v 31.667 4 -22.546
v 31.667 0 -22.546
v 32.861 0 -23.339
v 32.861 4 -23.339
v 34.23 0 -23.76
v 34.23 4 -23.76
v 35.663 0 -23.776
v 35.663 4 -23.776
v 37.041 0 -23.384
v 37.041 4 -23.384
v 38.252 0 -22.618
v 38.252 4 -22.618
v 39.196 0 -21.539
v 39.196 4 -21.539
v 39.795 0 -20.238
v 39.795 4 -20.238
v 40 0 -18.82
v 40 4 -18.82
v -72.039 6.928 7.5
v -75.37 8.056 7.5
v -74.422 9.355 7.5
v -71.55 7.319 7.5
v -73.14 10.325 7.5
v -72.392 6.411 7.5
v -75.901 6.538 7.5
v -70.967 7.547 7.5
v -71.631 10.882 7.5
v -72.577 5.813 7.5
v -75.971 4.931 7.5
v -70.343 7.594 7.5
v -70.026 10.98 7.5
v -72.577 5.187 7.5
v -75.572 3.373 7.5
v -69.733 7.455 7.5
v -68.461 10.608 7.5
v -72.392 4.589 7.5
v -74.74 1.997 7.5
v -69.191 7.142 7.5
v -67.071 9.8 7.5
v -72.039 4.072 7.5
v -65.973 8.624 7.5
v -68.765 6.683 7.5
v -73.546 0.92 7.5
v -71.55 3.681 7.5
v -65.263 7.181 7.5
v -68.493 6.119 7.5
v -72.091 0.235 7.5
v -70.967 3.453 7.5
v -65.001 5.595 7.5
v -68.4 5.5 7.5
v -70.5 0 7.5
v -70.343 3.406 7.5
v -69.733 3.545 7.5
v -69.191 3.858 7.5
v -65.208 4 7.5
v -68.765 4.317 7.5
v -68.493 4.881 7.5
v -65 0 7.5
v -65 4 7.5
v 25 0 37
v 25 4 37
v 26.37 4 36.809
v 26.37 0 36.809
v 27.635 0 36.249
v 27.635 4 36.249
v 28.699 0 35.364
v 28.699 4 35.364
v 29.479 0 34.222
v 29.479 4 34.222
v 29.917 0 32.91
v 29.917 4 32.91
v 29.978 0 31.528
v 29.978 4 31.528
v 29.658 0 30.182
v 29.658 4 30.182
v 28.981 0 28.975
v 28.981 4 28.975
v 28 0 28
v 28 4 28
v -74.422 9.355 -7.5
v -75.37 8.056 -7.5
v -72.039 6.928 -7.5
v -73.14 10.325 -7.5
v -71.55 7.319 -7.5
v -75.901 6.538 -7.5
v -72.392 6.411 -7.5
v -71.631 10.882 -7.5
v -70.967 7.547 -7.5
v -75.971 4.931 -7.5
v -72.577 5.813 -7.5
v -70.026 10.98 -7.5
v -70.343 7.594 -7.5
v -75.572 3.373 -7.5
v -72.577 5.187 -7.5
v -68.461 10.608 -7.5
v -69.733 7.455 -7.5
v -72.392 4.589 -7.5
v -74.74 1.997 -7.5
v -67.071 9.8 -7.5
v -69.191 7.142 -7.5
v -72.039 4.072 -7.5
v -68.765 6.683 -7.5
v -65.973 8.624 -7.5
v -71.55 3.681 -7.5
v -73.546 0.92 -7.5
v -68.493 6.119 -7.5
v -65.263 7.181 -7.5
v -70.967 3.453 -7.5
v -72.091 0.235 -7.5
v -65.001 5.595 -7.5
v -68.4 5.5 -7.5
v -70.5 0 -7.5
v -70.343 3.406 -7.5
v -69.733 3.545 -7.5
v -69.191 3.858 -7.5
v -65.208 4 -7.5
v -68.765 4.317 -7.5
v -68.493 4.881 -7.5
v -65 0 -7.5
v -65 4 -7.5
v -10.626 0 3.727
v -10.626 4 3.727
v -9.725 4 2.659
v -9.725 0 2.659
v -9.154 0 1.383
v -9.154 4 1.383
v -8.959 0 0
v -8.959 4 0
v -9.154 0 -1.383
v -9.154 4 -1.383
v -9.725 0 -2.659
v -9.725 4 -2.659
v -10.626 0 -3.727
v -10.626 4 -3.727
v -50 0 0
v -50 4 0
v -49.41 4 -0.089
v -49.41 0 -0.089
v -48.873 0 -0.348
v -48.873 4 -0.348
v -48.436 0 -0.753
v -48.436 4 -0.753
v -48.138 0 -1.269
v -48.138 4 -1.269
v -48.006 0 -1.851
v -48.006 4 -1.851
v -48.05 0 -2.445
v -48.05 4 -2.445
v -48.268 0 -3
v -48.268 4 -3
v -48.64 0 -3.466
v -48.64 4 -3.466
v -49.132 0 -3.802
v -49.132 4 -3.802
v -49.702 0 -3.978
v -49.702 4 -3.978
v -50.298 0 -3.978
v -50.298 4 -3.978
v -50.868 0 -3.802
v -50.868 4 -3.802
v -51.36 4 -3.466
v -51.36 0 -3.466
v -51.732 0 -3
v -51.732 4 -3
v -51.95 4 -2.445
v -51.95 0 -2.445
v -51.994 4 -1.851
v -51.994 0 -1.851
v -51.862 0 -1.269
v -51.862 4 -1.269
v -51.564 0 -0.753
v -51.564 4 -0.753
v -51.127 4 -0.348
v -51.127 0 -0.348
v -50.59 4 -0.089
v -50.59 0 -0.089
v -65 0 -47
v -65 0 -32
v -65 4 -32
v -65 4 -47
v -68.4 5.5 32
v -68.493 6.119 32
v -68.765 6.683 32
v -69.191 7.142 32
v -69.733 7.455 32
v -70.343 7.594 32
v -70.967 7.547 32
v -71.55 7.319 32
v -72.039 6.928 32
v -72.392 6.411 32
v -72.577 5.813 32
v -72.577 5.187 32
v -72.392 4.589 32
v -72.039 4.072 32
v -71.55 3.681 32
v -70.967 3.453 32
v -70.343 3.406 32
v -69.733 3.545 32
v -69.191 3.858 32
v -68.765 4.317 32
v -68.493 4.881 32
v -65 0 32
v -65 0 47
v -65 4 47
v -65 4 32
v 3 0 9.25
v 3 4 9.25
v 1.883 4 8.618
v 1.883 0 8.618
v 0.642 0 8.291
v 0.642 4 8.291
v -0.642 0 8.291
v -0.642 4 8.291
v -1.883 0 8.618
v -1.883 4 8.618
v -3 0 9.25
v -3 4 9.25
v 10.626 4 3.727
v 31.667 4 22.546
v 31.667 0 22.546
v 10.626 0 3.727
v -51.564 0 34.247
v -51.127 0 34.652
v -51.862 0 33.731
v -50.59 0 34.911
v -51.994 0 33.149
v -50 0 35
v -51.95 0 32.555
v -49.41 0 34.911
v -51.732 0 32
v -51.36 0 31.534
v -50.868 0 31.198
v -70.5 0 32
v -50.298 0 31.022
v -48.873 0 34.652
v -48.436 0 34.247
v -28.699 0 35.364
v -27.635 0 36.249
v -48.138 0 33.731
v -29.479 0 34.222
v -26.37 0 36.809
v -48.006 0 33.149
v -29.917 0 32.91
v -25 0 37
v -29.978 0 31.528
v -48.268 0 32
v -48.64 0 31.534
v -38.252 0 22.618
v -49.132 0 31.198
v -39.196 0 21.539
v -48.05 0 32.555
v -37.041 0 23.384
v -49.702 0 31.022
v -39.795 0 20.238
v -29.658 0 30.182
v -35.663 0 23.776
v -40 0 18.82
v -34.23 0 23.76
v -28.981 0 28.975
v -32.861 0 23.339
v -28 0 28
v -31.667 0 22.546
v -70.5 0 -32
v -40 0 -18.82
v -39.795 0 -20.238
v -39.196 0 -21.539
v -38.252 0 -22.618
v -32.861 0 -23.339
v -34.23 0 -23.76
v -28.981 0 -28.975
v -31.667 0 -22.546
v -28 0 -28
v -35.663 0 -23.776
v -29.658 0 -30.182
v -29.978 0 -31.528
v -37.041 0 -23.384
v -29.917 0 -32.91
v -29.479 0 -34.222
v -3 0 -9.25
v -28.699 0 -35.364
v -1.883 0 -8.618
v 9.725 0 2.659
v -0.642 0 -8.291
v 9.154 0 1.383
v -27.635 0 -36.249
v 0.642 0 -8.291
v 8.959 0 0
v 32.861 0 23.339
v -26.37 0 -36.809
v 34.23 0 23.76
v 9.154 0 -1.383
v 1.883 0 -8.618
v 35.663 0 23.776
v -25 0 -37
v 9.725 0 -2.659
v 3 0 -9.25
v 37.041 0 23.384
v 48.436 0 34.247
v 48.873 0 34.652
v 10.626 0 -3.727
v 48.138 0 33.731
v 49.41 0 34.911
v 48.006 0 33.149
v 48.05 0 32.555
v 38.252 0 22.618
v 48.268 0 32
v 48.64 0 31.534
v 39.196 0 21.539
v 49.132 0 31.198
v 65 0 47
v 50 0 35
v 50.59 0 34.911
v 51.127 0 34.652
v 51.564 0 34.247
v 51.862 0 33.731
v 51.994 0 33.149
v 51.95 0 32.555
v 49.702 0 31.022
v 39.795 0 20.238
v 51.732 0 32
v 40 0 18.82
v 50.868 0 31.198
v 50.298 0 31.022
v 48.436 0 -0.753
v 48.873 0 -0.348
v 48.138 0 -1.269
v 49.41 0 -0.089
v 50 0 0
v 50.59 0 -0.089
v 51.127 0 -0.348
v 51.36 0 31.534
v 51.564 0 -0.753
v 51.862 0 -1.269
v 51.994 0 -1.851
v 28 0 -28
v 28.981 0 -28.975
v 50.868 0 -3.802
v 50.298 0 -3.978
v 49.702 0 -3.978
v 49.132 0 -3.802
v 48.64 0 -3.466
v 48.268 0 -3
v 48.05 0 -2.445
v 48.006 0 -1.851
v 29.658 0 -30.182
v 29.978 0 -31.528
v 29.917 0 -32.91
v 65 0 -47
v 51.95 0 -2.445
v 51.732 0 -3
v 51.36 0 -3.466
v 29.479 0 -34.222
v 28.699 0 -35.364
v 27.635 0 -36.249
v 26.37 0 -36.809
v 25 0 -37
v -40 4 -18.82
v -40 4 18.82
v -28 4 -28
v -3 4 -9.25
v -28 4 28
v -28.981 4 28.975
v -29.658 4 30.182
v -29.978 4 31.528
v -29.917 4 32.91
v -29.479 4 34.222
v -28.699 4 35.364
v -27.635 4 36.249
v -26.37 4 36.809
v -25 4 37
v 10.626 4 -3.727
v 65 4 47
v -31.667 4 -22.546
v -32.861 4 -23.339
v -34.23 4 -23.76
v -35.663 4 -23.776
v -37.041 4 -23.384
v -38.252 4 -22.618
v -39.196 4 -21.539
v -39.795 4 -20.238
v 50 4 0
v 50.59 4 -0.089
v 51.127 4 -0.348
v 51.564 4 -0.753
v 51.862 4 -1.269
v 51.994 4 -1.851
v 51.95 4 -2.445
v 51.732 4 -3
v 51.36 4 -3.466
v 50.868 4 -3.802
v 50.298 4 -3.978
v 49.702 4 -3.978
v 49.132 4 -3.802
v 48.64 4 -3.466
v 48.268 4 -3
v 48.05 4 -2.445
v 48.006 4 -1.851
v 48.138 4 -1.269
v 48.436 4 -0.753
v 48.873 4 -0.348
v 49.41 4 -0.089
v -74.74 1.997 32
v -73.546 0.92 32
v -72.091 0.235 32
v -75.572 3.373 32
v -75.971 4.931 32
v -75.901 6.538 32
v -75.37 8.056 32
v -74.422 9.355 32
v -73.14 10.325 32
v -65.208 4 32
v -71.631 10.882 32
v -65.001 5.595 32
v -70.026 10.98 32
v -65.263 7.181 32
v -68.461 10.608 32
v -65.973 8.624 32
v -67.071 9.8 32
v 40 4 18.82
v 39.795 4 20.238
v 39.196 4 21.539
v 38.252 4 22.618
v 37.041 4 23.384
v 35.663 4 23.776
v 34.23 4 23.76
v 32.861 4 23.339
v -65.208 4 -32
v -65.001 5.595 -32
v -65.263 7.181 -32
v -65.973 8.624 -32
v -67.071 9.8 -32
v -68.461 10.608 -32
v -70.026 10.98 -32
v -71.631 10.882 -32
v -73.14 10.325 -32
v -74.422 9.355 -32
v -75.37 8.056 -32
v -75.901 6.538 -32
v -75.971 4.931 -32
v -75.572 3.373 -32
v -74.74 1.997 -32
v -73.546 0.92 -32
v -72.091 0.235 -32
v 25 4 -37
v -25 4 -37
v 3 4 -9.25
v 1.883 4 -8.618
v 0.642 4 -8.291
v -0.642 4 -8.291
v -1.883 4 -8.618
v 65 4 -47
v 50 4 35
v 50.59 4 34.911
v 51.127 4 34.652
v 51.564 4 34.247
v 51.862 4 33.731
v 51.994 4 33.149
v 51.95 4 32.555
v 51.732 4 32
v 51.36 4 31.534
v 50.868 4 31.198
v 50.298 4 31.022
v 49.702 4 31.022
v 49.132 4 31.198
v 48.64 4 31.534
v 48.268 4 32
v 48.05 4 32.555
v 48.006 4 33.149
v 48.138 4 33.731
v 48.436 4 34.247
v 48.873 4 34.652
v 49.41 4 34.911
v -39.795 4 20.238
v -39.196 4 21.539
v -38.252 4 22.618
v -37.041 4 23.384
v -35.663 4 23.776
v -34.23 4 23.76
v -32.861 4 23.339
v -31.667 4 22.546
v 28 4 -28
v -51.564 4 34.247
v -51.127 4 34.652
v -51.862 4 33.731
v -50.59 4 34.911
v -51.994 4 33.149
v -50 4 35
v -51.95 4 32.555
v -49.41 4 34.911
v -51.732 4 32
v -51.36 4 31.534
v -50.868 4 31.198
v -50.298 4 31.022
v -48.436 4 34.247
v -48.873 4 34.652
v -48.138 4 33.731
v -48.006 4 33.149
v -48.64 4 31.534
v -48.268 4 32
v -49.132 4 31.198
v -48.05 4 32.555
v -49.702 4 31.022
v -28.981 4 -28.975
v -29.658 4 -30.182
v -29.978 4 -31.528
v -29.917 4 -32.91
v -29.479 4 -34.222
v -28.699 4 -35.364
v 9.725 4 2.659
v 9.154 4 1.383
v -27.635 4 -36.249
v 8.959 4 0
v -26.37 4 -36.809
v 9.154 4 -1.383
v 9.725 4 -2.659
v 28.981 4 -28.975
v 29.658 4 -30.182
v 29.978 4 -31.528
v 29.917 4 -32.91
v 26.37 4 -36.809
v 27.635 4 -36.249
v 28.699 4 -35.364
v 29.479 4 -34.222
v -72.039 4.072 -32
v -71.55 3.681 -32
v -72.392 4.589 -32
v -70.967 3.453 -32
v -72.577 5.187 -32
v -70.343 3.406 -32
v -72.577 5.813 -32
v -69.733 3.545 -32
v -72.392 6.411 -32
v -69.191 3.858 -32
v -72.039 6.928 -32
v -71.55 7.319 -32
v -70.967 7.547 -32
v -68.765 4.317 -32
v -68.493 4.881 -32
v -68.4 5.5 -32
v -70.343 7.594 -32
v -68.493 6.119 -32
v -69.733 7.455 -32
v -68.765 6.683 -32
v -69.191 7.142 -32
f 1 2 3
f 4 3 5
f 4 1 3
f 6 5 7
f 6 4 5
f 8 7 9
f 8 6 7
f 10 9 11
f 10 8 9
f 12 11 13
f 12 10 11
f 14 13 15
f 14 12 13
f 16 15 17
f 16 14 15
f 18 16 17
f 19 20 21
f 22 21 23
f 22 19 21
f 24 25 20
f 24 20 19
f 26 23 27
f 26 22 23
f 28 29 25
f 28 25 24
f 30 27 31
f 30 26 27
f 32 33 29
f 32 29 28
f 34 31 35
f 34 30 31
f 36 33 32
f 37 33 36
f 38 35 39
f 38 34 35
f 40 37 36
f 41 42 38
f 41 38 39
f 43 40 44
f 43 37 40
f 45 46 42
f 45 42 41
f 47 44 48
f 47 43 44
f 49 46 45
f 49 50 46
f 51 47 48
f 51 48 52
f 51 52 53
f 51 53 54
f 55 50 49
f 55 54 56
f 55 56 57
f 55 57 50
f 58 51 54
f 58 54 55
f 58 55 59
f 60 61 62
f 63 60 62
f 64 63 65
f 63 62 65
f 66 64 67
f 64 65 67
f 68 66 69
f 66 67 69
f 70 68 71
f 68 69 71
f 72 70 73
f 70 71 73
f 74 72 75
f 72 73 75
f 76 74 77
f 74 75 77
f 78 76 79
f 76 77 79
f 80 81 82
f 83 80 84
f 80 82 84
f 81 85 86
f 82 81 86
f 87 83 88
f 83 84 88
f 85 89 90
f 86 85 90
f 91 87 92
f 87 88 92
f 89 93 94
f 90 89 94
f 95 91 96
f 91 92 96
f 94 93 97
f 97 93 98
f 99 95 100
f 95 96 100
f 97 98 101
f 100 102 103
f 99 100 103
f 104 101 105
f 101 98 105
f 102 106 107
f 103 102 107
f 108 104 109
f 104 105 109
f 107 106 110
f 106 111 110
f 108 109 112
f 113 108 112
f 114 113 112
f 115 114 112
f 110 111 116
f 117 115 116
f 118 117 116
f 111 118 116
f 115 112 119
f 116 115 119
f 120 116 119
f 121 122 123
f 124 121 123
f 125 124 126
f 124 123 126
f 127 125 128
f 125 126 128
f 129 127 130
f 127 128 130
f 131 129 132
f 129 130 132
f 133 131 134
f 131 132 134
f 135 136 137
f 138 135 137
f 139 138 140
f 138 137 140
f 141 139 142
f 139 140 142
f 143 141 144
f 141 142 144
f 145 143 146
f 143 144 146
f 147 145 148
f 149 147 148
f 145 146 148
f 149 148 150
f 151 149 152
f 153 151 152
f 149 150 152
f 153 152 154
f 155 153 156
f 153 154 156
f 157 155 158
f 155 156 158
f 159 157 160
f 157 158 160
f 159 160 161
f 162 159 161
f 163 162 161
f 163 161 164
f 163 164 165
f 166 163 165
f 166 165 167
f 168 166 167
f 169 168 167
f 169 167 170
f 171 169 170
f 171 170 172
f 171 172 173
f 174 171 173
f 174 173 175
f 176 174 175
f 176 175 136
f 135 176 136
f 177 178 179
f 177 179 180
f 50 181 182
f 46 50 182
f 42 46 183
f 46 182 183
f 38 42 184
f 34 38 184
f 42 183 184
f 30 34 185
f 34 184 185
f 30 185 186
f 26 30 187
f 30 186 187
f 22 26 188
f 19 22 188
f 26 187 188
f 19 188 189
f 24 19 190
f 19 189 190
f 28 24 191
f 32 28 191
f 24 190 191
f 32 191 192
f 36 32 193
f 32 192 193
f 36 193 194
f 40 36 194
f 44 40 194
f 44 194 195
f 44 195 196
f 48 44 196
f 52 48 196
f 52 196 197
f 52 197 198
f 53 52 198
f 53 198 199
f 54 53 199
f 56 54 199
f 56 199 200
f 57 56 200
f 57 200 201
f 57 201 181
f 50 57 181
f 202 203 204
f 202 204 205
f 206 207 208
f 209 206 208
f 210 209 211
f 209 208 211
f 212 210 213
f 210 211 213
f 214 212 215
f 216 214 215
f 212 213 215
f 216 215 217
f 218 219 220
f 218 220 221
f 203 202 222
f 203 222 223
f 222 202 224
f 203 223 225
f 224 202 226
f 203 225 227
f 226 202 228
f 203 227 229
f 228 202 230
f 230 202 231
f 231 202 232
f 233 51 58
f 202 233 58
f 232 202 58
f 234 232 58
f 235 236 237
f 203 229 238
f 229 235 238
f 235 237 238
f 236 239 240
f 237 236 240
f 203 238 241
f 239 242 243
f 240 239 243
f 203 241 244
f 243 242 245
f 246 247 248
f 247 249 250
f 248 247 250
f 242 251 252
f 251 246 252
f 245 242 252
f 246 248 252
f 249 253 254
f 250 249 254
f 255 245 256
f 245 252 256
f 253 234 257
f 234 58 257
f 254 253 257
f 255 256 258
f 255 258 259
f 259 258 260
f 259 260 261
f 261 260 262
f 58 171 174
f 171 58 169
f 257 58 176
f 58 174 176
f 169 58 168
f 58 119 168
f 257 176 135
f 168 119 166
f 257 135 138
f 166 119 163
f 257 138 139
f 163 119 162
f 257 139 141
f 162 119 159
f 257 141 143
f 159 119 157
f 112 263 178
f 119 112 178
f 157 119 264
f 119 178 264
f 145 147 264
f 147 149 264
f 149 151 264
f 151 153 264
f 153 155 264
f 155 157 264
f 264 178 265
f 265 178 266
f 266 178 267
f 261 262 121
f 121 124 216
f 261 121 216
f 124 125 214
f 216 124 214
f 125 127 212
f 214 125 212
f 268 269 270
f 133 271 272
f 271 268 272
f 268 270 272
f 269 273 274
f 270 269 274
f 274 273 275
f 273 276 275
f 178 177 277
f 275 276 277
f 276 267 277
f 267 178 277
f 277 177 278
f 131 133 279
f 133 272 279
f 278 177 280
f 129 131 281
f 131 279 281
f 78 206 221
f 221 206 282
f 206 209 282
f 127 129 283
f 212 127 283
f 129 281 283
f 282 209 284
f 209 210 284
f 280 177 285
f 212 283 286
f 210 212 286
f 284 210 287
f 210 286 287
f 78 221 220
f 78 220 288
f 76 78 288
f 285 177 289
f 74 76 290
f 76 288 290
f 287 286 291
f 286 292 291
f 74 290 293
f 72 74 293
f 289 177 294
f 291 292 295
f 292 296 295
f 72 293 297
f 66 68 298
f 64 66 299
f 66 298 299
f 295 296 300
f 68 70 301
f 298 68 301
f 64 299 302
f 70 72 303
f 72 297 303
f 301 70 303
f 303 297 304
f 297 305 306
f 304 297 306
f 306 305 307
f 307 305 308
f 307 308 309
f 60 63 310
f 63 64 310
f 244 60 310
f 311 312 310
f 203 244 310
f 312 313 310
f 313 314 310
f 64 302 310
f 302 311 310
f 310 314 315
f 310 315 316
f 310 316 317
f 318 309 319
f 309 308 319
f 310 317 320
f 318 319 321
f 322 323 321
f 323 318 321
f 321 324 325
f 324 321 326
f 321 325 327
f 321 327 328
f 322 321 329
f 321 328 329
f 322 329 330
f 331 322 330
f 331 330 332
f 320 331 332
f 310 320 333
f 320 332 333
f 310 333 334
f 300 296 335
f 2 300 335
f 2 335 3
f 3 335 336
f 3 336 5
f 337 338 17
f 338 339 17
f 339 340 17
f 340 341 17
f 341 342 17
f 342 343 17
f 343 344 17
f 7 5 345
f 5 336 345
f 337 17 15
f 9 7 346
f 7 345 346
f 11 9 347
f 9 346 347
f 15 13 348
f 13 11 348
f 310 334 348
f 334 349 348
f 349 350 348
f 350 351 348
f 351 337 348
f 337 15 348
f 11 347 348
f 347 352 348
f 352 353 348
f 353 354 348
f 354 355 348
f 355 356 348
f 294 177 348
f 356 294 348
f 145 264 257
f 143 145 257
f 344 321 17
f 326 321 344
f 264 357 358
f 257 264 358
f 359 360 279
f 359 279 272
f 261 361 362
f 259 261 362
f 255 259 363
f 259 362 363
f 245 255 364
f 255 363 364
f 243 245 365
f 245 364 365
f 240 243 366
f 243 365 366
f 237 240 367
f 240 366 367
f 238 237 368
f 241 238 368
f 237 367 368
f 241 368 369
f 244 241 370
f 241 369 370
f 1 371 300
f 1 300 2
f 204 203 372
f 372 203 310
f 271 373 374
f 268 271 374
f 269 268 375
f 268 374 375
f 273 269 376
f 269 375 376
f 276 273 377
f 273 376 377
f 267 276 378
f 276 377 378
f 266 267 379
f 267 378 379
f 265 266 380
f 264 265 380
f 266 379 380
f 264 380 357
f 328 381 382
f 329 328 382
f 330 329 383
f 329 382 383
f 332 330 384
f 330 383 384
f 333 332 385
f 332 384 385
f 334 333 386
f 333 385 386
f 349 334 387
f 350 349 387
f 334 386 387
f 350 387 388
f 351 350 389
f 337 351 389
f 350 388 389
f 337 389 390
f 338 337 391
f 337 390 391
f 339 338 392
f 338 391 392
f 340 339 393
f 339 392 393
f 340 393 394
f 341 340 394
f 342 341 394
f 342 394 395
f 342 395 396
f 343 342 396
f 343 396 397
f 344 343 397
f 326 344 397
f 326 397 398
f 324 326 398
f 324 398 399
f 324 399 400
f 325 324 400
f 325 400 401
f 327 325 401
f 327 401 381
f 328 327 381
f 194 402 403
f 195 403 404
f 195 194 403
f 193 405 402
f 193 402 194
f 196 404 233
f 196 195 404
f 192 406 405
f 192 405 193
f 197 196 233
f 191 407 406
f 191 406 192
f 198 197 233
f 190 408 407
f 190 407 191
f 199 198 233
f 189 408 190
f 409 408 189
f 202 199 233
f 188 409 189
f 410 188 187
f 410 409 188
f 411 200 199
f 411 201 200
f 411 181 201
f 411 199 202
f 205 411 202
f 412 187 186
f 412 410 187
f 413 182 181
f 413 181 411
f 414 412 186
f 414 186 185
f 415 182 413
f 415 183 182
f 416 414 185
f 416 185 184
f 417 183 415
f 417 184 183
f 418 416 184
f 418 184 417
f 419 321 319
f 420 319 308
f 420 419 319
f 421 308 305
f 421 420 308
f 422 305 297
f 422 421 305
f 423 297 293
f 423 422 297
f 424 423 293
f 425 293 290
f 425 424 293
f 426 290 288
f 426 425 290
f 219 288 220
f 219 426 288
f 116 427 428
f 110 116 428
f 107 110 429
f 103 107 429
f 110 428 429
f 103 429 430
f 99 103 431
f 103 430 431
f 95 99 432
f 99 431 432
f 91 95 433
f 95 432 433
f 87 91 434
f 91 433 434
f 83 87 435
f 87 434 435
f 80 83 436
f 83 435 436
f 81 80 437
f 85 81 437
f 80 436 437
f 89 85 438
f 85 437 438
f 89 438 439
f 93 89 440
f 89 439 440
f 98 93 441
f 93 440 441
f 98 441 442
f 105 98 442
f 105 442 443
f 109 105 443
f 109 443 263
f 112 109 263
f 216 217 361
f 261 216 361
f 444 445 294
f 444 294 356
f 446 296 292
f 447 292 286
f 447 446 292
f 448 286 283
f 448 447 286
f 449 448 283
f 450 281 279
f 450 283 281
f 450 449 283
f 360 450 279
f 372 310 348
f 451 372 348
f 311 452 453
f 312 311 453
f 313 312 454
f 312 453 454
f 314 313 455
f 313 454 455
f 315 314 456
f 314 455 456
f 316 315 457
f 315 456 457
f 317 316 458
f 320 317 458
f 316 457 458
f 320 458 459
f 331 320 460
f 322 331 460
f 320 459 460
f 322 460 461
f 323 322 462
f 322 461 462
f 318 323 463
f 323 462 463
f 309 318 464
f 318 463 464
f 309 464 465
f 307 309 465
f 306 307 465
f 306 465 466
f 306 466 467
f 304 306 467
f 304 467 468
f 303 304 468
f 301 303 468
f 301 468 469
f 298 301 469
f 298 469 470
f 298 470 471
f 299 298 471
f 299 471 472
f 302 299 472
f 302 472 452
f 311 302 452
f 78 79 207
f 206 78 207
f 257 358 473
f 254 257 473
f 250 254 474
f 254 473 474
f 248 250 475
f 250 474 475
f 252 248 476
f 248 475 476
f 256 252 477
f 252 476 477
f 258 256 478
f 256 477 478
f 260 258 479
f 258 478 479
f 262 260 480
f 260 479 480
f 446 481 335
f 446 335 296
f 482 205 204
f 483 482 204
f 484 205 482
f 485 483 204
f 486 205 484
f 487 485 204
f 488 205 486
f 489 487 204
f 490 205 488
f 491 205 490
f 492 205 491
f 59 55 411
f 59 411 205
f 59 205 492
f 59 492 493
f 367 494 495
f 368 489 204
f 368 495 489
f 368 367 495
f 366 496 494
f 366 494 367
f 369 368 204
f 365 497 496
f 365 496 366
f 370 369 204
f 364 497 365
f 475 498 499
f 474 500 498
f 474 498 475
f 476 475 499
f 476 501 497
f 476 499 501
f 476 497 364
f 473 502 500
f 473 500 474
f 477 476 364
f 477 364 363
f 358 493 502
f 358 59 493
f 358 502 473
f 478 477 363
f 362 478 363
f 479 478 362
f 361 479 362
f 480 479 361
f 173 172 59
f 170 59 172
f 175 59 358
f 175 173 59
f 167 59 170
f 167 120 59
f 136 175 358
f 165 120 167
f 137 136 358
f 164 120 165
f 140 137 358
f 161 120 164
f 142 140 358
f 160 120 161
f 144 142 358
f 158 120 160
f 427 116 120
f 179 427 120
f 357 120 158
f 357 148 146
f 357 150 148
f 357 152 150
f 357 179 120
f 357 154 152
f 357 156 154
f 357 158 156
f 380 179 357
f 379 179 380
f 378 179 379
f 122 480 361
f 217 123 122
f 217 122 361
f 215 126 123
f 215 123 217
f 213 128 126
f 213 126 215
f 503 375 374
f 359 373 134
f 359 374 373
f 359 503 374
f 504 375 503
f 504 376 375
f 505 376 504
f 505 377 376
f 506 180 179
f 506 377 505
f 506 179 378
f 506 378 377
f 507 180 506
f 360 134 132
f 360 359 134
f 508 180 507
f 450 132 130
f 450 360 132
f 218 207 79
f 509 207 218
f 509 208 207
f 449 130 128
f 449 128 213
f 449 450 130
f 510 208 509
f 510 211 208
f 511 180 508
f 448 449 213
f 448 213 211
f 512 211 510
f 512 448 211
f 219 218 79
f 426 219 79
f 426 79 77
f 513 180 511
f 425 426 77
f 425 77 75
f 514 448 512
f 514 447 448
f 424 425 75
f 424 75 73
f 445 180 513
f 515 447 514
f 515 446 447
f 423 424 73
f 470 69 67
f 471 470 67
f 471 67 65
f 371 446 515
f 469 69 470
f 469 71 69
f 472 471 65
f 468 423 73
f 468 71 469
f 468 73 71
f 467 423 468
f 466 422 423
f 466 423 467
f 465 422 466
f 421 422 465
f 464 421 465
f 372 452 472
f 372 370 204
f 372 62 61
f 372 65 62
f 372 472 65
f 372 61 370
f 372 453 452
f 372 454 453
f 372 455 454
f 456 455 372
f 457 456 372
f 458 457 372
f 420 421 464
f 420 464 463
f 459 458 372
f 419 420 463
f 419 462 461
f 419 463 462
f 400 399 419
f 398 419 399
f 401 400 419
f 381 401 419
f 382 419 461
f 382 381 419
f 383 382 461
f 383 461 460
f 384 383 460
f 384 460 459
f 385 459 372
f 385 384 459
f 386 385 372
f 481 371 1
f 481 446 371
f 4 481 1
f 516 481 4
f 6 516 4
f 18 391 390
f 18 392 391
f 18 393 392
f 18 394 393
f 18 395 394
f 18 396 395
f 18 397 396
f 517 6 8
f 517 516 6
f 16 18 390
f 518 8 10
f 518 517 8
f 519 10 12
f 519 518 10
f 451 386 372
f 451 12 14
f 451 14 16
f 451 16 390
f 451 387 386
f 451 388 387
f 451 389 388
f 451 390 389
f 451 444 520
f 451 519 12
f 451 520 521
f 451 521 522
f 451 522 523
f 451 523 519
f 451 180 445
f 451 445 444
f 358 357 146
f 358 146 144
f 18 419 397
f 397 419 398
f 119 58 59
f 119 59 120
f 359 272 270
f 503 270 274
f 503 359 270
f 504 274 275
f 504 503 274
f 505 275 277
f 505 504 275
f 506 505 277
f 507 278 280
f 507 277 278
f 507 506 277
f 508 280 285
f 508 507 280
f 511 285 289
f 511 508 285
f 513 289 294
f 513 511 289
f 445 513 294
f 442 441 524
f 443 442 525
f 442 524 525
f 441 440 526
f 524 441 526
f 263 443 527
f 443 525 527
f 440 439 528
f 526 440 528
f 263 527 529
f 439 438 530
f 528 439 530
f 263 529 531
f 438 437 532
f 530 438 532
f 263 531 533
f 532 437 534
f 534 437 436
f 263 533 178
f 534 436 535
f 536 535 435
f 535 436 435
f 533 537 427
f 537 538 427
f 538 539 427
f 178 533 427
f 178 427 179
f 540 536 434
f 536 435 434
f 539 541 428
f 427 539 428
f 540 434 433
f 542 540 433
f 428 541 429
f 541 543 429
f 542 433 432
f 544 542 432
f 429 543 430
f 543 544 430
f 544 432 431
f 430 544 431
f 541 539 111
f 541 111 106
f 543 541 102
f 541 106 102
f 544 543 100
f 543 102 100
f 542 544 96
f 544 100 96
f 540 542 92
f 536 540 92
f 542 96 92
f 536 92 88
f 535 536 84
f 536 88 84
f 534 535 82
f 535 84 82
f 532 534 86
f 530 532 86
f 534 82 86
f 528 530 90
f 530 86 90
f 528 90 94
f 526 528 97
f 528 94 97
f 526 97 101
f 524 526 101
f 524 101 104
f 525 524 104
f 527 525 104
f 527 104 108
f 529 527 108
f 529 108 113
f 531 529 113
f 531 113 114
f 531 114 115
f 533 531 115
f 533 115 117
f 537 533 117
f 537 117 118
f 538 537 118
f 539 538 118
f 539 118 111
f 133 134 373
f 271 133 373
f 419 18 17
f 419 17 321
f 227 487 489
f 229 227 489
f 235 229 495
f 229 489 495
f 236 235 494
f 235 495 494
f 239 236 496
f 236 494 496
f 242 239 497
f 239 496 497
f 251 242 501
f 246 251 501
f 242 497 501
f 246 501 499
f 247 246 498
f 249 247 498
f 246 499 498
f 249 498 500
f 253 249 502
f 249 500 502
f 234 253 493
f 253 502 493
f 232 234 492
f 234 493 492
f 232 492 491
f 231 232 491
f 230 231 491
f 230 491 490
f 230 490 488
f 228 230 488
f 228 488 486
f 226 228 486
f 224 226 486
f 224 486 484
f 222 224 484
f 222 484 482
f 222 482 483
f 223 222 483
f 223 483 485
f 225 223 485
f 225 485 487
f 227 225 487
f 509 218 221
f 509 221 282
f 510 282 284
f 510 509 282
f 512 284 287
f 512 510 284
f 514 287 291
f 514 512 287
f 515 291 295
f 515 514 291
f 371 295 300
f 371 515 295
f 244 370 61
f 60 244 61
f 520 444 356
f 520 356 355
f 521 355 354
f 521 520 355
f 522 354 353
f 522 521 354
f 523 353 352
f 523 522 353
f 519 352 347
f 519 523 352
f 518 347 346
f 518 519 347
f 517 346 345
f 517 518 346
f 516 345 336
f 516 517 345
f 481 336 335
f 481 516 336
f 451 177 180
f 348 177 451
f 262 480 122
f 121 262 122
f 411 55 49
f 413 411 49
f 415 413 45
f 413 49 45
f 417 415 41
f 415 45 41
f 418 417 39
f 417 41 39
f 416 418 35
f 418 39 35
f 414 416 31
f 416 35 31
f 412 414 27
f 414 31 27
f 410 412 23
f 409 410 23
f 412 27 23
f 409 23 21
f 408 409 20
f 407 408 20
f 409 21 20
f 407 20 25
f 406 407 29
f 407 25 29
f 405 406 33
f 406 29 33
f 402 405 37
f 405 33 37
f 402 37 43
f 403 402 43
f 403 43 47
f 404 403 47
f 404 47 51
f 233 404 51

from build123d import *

# Parameters (mm, degrees)
SKETCH_1_W           = 130
SKETCH_1_H           = 94
EXTRUDE_1_DEPTH      = 4
EXTRUDE_2_DEPTH      = 32
EXTRUDE_2_DEPTH_BACK = 32
SKETCH_4_R           = 2.1
CUT_EXTRUDE_1_DEPTH  = 122.379569945
SKETCH_10_W          = 11
SKETCH_10_H          = 15
CUT_EXTRUDE_2_DEPTH  = 24
CUT_EXTRUDE_3_DEPTH  = 10
SKETCH_12_R          = 2
CUT_EXTRUDE_4_DEPTH  = 10


with BuildPart() as part:
    # Эскиз1 → Бобышка-Вытянуть1 (new body)
    with BuildSketch(Plane(origin=(0, 0, 0), x_dir=(1, 0, 0), z_dir=(0, 1, 0))):
        Rectangle(SKETCH_1_W, SKETCH_1_H)
    extrude(amount=EXTRUDE_1_DEPTH)

    # Эскиз2 → Бобышка-Вытянуть2 (add, two sides: drawn at the far end of the back side and taken through both)
    with BuildSketch(Plane.XY.offset(-EXTRUDE_2_DEPTH_BACK)):
        with BuildLine():
            Line((-65, 4), (-65.208497378, 4))
            ThreePointArc((-65.208497378, 4), (-73.81662479, 9.887482194), (-70.5, 0))
            Line((-70.5, 0), (-65, 0))
            Line((-65, 0), (-65, 4))
        make_face()
    extrude(amount=EXTRUDE_2_DEPTH + EXTRUDE_2_DEPTH_BACK)

    # Эскиз4 → Вырез-Вытянуть1 (cut, through all)
    with BuildSketch(Plane.XY.offset(47)):
        with Locations((-70.5, 5.5)):
            Circle(SKETCH_4_R)
    extrude(amount=-CUT_EXTRUDE_1_DEPTH, mode=Mode.SUBTRACT)

    # Эскиз10 → Вырез-Вытянуть2 (cut)
    with BuildSketch(Plane(origin=(0, 0, 0), x_dir=(1, 0, 0), z_dir=(0, 1, 0))):
        with Locations((-70.5, 0)):
            Rectangle(SKETCH_10_W, SKETCH_10_H)
    extrude(amount=CUT_EXTRUDE_2_DEPTH, mode=Mode.SUBTRACT)

    # Эскиз11 → Вырез-Вытянуть3 (cut)
    with BuildSketch(Plane(origin=(0, 4, 0), x_dir=(1, 0, 0), z_dir=(0, 1, 0))):
        with BuildLine():
            Line((-25, 37), (25, 37))
            ThreePointArc((25, 37), (29.74341649, 33.58113883), (28, 28))
            Line((28, 28), (3, 9.25))
            ThreePointArc((3, 9.25), (0, 8.25), (-3, 9.25))
            Line((-3, 9.25), (-28, 28))
            ThreePointArc((-28, 28), (-29.74341649, 33.58113883), (-25, 37))
        make_face()
        with BuildLine():
            Line((-3, -9.25), (-28, -28))
            ThreePointArc((-28, -28), (-29.74341649, -33.58113883), (-25, -37))
            Line((-25, -37), (25, -37))
            ThreePointArc((25, -37), (29.74341649, -33.58113883), (28, -28))
            Line((28, -28), (3, -9.25))
            ThreePointArc((3, -9.25), (0, -8.25), (-3, -9.25))
        make_face()
        with BuildLine():
            Line((-10.625647004, 3.726779962), (-31.666666667, 22.546440075))
            ThreePointArc((-31.666666667, 22.546440075), (-37.041241452, 23.384014758), (-40, 18.819660113))
            Line((-40, 18.819660113), (-40, -18.819660113))
            ThreePointArc((-40, -18.819660113), (-37.041241452, -23.384014758), (-31.666666667, -22.546440075))
            Line((-31.666666667, -22.546440075), (-10.625647004, -3.726779962))
            ThreePointArc((-10.625647004, -3.726779962), (-8.958980338, 0), (-10.625647004, 3.726779962))
        make_face()
        with BuildLine():
            Line((10.625647004, 3.726779962), (31.666666667, 22.546440075))
            ThreePointArc((31.666666667, 22.546440075), (37.041241452, 23.384014758), (40, 18.819660113))
            Line((40, 18.819660113), (40, -18.819660113))
            ThreePointArc((40, -18.819660113), (37.041241452, -23.384014758), (31.666666667, -22.546440075))
            Line((31.666666667, -22.546440075), (10.625647004, -3.726779962))
            ThreePointArc((10.625647004, -3.726779962), (8.958980338, 0), (10.625647004, 3.726779962))
        make_face()
    extrude(amount=-CUT_EXTRUDE_3_DEPTH, mode=Mode.SUBTRACT)

    # Эскиз12 → Вырез-Вытянуть4 (cut)
    with BuildSketch(Plane(origin=(0, 4, 0), x_dir=(1, 0, 0), z_dir=(0, 1, 0))):
        with Locations(Location((-50, 2, 0), (0, 0, 270))):
            Circle(SKETCH_12_R)
        with Locations(Location((50, 2, 0), (0, 0, 270))):
            Circle(SKETCH_12_R)
        with Locations(Location((50, -33, 0), (0, 0, 270))):
            Circle(SKETCH_12_R)
        with Locations(Location((-50, -33, 0), (0, 0, 270))):
            Circle(SKETCH_12_R)
    extrude(amount=-CUT_EXTRUDE_4_DEPTH, mode=Mode.SUBTRACT)


solid = part.part
